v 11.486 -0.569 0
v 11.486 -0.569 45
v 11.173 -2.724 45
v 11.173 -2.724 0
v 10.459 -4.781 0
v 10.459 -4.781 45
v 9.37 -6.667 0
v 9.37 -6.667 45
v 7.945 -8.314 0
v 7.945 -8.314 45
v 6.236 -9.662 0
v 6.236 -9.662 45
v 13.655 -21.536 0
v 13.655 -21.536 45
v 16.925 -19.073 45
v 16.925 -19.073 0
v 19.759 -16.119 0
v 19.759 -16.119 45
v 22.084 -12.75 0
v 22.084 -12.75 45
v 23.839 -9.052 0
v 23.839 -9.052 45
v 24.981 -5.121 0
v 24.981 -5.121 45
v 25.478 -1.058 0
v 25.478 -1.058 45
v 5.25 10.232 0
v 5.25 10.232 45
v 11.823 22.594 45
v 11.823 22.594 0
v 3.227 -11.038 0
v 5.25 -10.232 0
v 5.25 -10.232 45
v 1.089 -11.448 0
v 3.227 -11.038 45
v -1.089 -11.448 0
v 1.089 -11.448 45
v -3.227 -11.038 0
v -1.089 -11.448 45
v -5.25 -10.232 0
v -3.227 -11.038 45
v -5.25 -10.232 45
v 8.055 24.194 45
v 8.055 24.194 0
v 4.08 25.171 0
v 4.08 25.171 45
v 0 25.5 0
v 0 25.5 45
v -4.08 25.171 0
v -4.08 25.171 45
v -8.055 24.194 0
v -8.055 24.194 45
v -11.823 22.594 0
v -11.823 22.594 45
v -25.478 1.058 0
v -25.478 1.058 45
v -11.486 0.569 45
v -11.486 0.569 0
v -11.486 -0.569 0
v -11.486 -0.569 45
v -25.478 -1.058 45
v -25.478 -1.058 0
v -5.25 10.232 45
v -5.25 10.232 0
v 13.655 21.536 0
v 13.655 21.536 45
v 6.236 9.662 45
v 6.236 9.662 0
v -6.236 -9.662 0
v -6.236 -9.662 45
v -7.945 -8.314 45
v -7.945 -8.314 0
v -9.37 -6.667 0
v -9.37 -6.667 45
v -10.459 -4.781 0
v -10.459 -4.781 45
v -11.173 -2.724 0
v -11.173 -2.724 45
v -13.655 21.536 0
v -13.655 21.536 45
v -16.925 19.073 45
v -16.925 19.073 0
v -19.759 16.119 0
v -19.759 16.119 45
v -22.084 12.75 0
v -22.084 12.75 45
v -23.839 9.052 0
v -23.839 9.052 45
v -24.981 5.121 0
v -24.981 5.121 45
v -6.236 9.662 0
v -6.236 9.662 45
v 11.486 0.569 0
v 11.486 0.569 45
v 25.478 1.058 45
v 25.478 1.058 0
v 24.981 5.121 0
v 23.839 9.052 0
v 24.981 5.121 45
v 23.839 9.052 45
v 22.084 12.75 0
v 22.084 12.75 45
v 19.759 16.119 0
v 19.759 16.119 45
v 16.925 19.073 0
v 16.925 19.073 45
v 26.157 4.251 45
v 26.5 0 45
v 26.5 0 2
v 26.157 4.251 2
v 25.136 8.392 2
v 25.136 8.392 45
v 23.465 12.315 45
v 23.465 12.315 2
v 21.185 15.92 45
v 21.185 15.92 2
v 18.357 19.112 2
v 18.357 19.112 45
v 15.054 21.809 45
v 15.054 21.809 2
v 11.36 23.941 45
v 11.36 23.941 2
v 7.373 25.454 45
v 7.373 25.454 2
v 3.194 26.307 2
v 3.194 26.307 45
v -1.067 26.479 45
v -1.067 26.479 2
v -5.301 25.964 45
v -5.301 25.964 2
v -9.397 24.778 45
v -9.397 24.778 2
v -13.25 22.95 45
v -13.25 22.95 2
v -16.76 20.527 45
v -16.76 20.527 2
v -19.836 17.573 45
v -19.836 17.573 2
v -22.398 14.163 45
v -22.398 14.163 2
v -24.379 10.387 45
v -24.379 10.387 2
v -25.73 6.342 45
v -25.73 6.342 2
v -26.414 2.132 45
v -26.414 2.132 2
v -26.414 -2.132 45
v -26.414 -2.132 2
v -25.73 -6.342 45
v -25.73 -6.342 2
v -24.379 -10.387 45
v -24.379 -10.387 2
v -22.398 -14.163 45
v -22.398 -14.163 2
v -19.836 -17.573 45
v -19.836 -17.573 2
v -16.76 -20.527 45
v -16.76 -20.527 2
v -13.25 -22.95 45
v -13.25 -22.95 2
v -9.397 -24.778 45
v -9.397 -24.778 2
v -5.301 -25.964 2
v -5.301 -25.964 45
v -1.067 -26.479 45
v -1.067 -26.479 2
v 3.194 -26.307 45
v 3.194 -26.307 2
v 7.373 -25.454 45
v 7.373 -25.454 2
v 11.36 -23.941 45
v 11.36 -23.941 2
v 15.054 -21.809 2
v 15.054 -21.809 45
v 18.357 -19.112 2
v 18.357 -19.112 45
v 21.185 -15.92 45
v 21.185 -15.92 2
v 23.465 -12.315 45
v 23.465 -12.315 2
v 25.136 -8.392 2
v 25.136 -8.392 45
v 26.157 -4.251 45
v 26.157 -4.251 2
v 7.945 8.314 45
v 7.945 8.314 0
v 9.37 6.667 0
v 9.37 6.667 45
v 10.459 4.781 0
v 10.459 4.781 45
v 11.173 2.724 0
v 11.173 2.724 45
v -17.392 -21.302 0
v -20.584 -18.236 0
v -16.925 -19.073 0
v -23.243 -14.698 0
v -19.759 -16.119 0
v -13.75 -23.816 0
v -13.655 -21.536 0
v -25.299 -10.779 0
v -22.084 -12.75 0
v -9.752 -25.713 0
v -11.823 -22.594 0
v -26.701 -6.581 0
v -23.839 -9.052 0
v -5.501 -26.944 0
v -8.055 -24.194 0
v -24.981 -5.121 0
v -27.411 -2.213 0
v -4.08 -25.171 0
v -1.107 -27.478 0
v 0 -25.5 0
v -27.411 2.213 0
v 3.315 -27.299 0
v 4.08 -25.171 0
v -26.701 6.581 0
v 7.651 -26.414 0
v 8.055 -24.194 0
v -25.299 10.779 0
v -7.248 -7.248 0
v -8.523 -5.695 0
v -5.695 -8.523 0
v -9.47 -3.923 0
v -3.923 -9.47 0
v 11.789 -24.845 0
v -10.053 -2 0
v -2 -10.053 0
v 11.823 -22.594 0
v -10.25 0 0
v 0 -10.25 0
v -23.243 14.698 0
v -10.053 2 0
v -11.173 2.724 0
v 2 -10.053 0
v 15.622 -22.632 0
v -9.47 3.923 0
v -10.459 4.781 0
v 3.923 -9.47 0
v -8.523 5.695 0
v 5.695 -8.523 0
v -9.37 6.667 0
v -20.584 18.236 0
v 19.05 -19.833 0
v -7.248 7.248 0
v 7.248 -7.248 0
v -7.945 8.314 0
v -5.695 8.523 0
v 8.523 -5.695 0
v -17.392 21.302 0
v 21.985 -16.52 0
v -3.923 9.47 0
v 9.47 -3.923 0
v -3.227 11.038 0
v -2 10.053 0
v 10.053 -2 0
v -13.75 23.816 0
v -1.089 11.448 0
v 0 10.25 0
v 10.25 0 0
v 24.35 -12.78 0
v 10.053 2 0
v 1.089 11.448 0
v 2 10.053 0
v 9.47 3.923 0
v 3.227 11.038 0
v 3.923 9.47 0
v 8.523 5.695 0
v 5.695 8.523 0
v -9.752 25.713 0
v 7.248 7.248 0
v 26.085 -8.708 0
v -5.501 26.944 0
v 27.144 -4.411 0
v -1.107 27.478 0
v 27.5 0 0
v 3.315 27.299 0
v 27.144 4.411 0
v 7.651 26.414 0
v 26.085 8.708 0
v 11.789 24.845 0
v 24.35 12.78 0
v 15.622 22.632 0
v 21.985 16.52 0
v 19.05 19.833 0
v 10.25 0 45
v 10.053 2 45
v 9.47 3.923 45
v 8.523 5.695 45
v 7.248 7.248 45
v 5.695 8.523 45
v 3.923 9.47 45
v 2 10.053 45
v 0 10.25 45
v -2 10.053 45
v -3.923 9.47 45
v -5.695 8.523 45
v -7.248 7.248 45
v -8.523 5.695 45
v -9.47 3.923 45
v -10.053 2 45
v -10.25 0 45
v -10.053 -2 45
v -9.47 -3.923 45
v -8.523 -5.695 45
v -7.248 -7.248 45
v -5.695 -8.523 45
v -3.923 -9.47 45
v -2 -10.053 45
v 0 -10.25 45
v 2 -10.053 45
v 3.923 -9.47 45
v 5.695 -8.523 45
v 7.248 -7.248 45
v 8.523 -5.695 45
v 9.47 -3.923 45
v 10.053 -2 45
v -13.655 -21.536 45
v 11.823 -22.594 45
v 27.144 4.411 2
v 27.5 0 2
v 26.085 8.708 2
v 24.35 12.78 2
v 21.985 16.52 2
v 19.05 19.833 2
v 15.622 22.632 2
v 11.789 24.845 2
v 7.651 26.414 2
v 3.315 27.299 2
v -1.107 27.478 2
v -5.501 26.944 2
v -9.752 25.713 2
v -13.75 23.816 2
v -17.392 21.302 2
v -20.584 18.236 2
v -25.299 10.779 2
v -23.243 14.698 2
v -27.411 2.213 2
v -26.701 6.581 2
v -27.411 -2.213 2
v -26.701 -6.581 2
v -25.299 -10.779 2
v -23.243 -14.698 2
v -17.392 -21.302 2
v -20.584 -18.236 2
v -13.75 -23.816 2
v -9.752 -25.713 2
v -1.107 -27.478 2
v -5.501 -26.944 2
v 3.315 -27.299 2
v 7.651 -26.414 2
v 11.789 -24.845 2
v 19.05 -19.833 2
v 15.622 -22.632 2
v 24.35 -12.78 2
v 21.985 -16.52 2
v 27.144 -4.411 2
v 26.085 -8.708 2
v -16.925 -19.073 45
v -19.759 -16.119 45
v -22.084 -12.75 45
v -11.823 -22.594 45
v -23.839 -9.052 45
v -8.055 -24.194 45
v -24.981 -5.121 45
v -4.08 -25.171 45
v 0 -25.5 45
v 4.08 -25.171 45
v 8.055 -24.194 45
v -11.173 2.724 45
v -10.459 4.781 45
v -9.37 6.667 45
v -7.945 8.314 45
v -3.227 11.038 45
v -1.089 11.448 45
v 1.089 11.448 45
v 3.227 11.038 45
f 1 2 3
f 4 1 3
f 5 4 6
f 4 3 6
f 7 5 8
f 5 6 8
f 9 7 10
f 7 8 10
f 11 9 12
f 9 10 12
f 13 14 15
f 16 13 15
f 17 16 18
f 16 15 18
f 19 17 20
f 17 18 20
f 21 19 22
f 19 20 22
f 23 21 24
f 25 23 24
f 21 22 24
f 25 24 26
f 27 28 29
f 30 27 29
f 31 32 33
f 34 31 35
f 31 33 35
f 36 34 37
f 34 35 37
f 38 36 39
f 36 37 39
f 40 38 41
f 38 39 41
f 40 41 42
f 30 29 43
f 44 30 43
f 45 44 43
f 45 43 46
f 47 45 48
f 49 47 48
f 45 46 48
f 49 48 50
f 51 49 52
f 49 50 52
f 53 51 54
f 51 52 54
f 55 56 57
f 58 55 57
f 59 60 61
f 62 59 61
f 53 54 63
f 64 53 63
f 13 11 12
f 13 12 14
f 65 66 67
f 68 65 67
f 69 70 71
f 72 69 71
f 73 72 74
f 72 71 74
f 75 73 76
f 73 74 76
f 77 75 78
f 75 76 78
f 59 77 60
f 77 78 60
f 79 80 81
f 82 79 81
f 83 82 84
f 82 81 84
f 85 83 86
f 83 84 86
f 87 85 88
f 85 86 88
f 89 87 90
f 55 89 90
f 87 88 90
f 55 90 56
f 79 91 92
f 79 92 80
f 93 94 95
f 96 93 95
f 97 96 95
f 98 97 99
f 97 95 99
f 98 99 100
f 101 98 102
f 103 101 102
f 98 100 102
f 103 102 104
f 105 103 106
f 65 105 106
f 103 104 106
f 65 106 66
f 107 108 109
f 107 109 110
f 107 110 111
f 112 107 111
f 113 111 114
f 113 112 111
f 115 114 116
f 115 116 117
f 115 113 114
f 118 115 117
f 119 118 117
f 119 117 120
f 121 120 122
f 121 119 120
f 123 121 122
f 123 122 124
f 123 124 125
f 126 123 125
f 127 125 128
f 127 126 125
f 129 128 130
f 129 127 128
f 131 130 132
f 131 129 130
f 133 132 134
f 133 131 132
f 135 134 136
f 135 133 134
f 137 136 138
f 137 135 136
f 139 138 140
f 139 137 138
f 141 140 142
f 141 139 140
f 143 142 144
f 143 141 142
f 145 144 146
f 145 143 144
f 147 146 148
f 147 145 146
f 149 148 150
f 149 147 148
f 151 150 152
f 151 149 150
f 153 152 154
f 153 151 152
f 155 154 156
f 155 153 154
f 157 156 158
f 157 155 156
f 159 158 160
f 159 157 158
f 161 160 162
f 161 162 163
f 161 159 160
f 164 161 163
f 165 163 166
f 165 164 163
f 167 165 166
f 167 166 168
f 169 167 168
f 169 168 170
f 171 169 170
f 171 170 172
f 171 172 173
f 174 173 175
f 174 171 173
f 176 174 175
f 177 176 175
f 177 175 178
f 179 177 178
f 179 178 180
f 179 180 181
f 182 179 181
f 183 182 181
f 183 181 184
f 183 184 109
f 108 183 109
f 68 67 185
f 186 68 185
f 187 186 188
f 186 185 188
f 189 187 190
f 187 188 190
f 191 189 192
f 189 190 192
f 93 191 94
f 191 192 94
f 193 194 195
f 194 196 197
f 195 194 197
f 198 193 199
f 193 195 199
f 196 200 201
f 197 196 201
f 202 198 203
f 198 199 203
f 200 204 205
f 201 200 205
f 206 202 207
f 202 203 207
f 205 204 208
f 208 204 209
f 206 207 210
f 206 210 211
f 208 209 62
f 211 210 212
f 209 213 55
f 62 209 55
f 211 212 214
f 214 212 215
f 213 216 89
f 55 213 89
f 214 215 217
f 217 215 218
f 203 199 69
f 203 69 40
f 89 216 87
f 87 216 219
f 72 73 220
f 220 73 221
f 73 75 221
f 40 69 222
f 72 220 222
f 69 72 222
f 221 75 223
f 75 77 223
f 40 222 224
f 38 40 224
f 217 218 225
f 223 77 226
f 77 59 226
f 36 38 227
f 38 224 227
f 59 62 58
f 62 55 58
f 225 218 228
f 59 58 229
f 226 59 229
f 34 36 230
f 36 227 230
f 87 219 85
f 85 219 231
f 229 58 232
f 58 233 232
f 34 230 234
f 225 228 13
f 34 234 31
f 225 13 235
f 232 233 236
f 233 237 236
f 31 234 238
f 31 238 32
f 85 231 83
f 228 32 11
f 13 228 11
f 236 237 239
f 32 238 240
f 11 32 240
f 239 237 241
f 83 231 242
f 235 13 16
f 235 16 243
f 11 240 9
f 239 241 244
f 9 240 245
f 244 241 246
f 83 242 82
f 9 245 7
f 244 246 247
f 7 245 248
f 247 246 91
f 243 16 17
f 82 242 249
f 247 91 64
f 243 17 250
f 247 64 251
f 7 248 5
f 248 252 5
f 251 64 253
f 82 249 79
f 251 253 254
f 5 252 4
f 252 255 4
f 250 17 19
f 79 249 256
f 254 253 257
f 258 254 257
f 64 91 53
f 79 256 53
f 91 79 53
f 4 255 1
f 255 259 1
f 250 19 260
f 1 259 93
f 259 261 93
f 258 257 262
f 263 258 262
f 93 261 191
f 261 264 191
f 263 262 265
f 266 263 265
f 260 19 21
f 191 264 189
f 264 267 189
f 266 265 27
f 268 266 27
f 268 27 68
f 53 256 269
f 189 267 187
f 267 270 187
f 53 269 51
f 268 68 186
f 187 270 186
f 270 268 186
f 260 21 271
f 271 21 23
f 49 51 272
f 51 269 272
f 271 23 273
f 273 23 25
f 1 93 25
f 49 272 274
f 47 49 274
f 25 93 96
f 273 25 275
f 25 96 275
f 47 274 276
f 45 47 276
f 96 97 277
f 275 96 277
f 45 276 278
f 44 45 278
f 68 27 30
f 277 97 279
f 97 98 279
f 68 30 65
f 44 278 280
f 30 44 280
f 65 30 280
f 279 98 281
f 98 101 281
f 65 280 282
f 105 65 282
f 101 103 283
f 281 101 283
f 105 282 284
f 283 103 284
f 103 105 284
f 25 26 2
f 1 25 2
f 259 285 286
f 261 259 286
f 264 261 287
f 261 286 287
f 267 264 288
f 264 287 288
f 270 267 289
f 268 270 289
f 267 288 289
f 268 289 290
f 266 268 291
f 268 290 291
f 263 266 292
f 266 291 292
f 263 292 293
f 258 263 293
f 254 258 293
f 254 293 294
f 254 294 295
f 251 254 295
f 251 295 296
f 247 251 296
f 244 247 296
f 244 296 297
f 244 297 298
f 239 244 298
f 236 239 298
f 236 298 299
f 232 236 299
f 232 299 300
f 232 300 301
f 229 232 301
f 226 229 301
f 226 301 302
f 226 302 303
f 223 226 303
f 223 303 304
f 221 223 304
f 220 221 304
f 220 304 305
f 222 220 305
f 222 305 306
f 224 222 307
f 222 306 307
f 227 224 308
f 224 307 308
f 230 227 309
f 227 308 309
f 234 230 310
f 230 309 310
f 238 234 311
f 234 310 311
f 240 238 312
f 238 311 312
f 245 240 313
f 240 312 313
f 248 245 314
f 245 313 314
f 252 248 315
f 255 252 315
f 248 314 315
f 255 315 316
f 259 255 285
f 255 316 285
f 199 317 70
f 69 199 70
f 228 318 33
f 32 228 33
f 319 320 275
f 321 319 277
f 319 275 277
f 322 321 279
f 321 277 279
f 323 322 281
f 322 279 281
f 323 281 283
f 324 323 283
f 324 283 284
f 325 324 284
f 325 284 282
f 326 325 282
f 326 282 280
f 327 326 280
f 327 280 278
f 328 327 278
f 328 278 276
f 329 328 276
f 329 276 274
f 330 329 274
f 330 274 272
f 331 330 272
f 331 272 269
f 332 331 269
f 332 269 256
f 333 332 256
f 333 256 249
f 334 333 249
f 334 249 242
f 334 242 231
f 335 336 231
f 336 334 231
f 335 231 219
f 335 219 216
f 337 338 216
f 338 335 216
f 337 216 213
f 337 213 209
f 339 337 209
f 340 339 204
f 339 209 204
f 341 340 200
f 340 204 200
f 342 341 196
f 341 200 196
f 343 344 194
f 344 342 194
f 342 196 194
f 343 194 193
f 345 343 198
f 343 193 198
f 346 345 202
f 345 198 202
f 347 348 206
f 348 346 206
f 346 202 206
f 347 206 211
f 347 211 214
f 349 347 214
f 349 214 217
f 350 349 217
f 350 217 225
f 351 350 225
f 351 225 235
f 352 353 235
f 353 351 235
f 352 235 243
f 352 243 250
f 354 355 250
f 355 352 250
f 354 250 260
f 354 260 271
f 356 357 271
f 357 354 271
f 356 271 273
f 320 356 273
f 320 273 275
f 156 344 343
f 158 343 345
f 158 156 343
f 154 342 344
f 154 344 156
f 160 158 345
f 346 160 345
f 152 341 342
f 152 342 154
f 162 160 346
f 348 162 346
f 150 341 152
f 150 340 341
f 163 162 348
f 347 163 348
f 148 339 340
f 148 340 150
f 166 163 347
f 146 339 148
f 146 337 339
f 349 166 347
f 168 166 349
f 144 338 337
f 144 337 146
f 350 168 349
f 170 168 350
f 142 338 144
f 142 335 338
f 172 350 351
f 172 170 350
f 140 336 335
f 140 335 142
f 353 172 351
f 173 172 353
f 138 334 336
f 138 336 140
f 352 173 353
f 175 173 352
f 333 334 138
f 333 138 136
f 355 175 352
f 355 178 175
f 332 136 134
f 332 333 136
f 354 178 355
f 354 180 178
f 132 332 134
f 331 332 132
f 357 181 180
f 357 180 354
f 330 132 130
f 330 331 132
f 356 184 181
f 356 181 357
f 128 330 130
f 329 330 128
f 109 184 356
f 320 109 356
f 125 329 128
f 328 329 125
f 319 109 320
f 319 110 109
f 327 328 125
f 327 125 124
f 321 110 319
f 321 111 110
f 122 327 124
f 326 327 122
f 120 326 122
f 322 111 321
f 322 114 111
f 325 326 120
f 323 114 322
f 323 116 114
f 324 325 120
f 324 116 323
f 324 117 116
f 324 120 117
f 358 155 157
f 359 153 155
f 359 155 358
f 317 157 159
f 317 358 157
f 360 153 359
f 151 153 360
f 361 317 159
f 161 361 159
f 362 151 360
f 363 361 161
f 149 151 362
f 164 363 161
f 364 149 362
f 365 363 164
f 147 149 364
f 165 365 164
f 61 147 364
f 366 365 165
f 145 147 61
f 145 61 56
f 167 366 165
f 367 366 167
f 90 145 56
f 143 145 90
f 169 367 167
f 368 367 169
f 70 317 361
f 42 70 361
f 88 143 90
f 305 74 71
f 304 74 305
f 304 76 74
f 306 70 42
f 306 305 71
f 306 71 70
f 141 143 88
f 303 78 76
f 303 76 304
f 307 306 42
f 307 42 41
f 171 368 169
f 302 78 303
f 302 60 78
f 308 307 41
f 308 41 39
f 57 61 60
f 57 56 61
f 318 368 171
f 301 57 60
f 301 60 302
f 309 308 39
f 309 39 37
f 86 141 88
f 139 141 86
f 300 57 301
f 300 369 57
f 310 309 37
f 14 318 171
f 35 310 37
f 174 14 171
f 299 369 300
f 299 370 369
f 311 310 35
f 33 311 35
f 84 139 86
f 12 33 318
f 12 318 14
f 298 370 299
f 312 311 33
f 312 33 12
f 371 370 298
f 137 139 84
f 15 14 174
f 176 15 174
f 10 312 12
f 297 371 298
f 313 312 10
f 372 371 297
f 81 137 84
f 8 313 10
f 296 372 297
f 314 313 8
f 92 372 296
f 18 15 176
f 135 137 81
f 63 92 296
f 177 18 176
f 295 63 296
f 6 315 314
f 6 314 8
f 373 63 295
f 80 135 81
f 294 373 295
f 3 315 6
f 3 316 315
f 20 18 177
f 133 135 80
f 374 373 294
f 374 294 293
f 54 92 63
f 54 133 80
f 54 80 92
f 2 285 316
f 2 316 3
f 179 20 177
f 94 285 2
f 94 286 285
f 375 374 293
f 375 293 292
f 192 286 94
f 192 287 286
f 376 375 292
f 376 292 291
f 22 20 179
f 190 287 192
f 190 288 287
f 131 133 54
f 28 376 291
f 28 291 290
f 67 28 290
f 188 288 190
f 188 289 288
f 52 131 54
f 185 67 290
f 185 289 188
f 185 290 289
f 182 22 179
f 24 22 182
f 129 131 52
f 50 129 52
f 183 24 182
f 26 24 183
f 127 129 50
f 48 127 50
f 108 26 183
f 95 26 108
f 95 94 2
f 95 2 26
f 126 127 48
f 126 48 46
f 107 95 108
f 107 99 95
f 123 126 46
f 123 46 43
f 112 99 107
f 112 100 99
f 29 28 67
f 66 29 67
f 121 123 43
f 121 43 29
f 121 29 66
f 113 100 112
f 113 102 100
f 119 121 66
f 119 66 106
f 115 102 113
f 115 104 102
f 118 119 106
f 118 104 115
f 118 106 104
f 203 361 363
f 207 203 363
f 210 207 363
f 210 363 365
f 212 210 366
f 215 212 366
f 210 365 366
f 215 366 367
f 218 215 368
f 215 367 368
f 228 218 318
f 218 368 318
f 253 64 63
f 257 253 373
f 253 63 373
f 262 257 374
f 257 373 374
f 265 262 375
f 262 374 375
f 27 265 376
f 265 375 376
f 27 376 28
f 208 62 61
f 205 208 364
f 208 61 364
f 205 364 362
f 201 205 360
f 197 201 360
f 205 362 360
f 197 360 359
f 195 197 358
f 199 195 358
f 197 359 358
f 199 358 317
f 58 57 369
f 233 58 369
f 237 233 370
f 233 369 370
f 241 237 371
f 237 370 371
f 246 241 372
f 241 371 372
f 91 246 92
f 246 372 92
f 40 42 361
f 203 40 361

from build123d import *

# Parameters (mm, degrees)
F0_R     = 27.5
F1_DEPTH = 45
F2_R     = 41.570783
F2_R_2   = 26.5
F3_DEPTH = 43
F4_R     = 10.25
F5_DEPTH = 45.001
F7_DEPTH = 45.001


with BuildPart() as f1:
    # F0 (on Top) → F1 (new body)
    with BuildSketch(Plane.XY):
        Circle(F0_R)
    extrude(amount=F1_DEPTH)

    # F2 (on face) → F3 (cut)
    with BuildSketch(Plane.XY.offset(45)):
        Circle(F2_R)
        Circle(F2_R_2, mode=Mode.SUBTRACT)
    extrude(amount=-F3_DEPTH, mode=Mode.SUBTRACT)

    # F4 (on face) → F5 (cut, through all)
    with BuildSketch(Plane.XY.offset(45)):
        Circle(F4_R)
    extrude(amount=-F5_DEPTH, mode=Mode.SUBTRACT)

    # F6 (on face) → F7 (cut, through all)
    with BuildSketch(Plane.XY.offset(45)):
        with BuildLine():
            ThreePointArc((-5.25, 10.231691), (0, 11.5), (5.25, 10.231691))
            Line((5.25, 10.231691), (11.822918, 22.593552))
            ThreePointArc((11.822918, 22.593552), (0, 25.5), (-11.822918, 22.593552))
            Line((-11.822918, 22.593552), (-5.25, 10.231691))
        make_face()
        with BuildLine():
            ThreePointArc((-11.485904, 0.569212), (-9.959292, 5.75), (-6.235904, 9.662479))
            Line((-6.235904, 9.662479), (-13.655131, 21.535724))
            ThreePointArc((-13.655131, 21.535724), (-22.083648, 12.75), (-25.478049, 1.057829))
            Line((-25.478049, 1.057829), (-11.485904, 0.569212))
        make_face()
        with BuildLine():
            ThreePointArc((-6.235904, -9.662479), (-9.959292, -5.75), (-11.485904, -0.569212))
            Line((-11.485904, -0.569212), (-25.478049, -1.057829))
            ThreePointArc((-25.478049, -1.057829), (-22.083648, -12.75), (-13.655131, -21.535724))
            Line((-13.655131, -21.535724), (-6.235904, -9.662479))
        make_face()
        with BuildLine():
            ThreePointArc((5.25, -10.231691), (0, -11.5), (-5.25, -10.231691))
            Line((-5.25, -10.231691), (-11.822918, -22.593552))
            ThreePointArc((-11.822918, -22.593552), (0, -25.5), (11.822918, -22.593552))
            Line((11.822918, -22.593552), (5.25, -10.231691))
        make_face()
        with BuildLine():
            ThreePointArc((11.485904, -0.569212), (9.959292, -5.75), (6.235904, -9.662479))
            Line((6.235904, -9.662479), (13.655131, -21.535724))
            ThreePointArc((13.655131, -21.535724), (22.083648, -12.75), (25.478049, -1.057829))
            Line((25.478049, -1.057829), (11.485904, -0.569212))
        make_face()
        with BuildLine():
            ThreePointArc((6.235904, 9.662479), (9.959292, 5.75), (11.485904, 0.569212))
            Line((11.485904, 0.569212), (25.478049, 1.057829))
            ThreePointArc((25.478049, 1.057829), (22.083648, 12.75), (13.655131, 21.535724))
            Line((13.655131, 21.535724), (6.235904, 9.662479))
        make_face()
    extrude(amount=-F7_DEPTH, mode=Mode.SUBTRACT)


solid = f1.part
